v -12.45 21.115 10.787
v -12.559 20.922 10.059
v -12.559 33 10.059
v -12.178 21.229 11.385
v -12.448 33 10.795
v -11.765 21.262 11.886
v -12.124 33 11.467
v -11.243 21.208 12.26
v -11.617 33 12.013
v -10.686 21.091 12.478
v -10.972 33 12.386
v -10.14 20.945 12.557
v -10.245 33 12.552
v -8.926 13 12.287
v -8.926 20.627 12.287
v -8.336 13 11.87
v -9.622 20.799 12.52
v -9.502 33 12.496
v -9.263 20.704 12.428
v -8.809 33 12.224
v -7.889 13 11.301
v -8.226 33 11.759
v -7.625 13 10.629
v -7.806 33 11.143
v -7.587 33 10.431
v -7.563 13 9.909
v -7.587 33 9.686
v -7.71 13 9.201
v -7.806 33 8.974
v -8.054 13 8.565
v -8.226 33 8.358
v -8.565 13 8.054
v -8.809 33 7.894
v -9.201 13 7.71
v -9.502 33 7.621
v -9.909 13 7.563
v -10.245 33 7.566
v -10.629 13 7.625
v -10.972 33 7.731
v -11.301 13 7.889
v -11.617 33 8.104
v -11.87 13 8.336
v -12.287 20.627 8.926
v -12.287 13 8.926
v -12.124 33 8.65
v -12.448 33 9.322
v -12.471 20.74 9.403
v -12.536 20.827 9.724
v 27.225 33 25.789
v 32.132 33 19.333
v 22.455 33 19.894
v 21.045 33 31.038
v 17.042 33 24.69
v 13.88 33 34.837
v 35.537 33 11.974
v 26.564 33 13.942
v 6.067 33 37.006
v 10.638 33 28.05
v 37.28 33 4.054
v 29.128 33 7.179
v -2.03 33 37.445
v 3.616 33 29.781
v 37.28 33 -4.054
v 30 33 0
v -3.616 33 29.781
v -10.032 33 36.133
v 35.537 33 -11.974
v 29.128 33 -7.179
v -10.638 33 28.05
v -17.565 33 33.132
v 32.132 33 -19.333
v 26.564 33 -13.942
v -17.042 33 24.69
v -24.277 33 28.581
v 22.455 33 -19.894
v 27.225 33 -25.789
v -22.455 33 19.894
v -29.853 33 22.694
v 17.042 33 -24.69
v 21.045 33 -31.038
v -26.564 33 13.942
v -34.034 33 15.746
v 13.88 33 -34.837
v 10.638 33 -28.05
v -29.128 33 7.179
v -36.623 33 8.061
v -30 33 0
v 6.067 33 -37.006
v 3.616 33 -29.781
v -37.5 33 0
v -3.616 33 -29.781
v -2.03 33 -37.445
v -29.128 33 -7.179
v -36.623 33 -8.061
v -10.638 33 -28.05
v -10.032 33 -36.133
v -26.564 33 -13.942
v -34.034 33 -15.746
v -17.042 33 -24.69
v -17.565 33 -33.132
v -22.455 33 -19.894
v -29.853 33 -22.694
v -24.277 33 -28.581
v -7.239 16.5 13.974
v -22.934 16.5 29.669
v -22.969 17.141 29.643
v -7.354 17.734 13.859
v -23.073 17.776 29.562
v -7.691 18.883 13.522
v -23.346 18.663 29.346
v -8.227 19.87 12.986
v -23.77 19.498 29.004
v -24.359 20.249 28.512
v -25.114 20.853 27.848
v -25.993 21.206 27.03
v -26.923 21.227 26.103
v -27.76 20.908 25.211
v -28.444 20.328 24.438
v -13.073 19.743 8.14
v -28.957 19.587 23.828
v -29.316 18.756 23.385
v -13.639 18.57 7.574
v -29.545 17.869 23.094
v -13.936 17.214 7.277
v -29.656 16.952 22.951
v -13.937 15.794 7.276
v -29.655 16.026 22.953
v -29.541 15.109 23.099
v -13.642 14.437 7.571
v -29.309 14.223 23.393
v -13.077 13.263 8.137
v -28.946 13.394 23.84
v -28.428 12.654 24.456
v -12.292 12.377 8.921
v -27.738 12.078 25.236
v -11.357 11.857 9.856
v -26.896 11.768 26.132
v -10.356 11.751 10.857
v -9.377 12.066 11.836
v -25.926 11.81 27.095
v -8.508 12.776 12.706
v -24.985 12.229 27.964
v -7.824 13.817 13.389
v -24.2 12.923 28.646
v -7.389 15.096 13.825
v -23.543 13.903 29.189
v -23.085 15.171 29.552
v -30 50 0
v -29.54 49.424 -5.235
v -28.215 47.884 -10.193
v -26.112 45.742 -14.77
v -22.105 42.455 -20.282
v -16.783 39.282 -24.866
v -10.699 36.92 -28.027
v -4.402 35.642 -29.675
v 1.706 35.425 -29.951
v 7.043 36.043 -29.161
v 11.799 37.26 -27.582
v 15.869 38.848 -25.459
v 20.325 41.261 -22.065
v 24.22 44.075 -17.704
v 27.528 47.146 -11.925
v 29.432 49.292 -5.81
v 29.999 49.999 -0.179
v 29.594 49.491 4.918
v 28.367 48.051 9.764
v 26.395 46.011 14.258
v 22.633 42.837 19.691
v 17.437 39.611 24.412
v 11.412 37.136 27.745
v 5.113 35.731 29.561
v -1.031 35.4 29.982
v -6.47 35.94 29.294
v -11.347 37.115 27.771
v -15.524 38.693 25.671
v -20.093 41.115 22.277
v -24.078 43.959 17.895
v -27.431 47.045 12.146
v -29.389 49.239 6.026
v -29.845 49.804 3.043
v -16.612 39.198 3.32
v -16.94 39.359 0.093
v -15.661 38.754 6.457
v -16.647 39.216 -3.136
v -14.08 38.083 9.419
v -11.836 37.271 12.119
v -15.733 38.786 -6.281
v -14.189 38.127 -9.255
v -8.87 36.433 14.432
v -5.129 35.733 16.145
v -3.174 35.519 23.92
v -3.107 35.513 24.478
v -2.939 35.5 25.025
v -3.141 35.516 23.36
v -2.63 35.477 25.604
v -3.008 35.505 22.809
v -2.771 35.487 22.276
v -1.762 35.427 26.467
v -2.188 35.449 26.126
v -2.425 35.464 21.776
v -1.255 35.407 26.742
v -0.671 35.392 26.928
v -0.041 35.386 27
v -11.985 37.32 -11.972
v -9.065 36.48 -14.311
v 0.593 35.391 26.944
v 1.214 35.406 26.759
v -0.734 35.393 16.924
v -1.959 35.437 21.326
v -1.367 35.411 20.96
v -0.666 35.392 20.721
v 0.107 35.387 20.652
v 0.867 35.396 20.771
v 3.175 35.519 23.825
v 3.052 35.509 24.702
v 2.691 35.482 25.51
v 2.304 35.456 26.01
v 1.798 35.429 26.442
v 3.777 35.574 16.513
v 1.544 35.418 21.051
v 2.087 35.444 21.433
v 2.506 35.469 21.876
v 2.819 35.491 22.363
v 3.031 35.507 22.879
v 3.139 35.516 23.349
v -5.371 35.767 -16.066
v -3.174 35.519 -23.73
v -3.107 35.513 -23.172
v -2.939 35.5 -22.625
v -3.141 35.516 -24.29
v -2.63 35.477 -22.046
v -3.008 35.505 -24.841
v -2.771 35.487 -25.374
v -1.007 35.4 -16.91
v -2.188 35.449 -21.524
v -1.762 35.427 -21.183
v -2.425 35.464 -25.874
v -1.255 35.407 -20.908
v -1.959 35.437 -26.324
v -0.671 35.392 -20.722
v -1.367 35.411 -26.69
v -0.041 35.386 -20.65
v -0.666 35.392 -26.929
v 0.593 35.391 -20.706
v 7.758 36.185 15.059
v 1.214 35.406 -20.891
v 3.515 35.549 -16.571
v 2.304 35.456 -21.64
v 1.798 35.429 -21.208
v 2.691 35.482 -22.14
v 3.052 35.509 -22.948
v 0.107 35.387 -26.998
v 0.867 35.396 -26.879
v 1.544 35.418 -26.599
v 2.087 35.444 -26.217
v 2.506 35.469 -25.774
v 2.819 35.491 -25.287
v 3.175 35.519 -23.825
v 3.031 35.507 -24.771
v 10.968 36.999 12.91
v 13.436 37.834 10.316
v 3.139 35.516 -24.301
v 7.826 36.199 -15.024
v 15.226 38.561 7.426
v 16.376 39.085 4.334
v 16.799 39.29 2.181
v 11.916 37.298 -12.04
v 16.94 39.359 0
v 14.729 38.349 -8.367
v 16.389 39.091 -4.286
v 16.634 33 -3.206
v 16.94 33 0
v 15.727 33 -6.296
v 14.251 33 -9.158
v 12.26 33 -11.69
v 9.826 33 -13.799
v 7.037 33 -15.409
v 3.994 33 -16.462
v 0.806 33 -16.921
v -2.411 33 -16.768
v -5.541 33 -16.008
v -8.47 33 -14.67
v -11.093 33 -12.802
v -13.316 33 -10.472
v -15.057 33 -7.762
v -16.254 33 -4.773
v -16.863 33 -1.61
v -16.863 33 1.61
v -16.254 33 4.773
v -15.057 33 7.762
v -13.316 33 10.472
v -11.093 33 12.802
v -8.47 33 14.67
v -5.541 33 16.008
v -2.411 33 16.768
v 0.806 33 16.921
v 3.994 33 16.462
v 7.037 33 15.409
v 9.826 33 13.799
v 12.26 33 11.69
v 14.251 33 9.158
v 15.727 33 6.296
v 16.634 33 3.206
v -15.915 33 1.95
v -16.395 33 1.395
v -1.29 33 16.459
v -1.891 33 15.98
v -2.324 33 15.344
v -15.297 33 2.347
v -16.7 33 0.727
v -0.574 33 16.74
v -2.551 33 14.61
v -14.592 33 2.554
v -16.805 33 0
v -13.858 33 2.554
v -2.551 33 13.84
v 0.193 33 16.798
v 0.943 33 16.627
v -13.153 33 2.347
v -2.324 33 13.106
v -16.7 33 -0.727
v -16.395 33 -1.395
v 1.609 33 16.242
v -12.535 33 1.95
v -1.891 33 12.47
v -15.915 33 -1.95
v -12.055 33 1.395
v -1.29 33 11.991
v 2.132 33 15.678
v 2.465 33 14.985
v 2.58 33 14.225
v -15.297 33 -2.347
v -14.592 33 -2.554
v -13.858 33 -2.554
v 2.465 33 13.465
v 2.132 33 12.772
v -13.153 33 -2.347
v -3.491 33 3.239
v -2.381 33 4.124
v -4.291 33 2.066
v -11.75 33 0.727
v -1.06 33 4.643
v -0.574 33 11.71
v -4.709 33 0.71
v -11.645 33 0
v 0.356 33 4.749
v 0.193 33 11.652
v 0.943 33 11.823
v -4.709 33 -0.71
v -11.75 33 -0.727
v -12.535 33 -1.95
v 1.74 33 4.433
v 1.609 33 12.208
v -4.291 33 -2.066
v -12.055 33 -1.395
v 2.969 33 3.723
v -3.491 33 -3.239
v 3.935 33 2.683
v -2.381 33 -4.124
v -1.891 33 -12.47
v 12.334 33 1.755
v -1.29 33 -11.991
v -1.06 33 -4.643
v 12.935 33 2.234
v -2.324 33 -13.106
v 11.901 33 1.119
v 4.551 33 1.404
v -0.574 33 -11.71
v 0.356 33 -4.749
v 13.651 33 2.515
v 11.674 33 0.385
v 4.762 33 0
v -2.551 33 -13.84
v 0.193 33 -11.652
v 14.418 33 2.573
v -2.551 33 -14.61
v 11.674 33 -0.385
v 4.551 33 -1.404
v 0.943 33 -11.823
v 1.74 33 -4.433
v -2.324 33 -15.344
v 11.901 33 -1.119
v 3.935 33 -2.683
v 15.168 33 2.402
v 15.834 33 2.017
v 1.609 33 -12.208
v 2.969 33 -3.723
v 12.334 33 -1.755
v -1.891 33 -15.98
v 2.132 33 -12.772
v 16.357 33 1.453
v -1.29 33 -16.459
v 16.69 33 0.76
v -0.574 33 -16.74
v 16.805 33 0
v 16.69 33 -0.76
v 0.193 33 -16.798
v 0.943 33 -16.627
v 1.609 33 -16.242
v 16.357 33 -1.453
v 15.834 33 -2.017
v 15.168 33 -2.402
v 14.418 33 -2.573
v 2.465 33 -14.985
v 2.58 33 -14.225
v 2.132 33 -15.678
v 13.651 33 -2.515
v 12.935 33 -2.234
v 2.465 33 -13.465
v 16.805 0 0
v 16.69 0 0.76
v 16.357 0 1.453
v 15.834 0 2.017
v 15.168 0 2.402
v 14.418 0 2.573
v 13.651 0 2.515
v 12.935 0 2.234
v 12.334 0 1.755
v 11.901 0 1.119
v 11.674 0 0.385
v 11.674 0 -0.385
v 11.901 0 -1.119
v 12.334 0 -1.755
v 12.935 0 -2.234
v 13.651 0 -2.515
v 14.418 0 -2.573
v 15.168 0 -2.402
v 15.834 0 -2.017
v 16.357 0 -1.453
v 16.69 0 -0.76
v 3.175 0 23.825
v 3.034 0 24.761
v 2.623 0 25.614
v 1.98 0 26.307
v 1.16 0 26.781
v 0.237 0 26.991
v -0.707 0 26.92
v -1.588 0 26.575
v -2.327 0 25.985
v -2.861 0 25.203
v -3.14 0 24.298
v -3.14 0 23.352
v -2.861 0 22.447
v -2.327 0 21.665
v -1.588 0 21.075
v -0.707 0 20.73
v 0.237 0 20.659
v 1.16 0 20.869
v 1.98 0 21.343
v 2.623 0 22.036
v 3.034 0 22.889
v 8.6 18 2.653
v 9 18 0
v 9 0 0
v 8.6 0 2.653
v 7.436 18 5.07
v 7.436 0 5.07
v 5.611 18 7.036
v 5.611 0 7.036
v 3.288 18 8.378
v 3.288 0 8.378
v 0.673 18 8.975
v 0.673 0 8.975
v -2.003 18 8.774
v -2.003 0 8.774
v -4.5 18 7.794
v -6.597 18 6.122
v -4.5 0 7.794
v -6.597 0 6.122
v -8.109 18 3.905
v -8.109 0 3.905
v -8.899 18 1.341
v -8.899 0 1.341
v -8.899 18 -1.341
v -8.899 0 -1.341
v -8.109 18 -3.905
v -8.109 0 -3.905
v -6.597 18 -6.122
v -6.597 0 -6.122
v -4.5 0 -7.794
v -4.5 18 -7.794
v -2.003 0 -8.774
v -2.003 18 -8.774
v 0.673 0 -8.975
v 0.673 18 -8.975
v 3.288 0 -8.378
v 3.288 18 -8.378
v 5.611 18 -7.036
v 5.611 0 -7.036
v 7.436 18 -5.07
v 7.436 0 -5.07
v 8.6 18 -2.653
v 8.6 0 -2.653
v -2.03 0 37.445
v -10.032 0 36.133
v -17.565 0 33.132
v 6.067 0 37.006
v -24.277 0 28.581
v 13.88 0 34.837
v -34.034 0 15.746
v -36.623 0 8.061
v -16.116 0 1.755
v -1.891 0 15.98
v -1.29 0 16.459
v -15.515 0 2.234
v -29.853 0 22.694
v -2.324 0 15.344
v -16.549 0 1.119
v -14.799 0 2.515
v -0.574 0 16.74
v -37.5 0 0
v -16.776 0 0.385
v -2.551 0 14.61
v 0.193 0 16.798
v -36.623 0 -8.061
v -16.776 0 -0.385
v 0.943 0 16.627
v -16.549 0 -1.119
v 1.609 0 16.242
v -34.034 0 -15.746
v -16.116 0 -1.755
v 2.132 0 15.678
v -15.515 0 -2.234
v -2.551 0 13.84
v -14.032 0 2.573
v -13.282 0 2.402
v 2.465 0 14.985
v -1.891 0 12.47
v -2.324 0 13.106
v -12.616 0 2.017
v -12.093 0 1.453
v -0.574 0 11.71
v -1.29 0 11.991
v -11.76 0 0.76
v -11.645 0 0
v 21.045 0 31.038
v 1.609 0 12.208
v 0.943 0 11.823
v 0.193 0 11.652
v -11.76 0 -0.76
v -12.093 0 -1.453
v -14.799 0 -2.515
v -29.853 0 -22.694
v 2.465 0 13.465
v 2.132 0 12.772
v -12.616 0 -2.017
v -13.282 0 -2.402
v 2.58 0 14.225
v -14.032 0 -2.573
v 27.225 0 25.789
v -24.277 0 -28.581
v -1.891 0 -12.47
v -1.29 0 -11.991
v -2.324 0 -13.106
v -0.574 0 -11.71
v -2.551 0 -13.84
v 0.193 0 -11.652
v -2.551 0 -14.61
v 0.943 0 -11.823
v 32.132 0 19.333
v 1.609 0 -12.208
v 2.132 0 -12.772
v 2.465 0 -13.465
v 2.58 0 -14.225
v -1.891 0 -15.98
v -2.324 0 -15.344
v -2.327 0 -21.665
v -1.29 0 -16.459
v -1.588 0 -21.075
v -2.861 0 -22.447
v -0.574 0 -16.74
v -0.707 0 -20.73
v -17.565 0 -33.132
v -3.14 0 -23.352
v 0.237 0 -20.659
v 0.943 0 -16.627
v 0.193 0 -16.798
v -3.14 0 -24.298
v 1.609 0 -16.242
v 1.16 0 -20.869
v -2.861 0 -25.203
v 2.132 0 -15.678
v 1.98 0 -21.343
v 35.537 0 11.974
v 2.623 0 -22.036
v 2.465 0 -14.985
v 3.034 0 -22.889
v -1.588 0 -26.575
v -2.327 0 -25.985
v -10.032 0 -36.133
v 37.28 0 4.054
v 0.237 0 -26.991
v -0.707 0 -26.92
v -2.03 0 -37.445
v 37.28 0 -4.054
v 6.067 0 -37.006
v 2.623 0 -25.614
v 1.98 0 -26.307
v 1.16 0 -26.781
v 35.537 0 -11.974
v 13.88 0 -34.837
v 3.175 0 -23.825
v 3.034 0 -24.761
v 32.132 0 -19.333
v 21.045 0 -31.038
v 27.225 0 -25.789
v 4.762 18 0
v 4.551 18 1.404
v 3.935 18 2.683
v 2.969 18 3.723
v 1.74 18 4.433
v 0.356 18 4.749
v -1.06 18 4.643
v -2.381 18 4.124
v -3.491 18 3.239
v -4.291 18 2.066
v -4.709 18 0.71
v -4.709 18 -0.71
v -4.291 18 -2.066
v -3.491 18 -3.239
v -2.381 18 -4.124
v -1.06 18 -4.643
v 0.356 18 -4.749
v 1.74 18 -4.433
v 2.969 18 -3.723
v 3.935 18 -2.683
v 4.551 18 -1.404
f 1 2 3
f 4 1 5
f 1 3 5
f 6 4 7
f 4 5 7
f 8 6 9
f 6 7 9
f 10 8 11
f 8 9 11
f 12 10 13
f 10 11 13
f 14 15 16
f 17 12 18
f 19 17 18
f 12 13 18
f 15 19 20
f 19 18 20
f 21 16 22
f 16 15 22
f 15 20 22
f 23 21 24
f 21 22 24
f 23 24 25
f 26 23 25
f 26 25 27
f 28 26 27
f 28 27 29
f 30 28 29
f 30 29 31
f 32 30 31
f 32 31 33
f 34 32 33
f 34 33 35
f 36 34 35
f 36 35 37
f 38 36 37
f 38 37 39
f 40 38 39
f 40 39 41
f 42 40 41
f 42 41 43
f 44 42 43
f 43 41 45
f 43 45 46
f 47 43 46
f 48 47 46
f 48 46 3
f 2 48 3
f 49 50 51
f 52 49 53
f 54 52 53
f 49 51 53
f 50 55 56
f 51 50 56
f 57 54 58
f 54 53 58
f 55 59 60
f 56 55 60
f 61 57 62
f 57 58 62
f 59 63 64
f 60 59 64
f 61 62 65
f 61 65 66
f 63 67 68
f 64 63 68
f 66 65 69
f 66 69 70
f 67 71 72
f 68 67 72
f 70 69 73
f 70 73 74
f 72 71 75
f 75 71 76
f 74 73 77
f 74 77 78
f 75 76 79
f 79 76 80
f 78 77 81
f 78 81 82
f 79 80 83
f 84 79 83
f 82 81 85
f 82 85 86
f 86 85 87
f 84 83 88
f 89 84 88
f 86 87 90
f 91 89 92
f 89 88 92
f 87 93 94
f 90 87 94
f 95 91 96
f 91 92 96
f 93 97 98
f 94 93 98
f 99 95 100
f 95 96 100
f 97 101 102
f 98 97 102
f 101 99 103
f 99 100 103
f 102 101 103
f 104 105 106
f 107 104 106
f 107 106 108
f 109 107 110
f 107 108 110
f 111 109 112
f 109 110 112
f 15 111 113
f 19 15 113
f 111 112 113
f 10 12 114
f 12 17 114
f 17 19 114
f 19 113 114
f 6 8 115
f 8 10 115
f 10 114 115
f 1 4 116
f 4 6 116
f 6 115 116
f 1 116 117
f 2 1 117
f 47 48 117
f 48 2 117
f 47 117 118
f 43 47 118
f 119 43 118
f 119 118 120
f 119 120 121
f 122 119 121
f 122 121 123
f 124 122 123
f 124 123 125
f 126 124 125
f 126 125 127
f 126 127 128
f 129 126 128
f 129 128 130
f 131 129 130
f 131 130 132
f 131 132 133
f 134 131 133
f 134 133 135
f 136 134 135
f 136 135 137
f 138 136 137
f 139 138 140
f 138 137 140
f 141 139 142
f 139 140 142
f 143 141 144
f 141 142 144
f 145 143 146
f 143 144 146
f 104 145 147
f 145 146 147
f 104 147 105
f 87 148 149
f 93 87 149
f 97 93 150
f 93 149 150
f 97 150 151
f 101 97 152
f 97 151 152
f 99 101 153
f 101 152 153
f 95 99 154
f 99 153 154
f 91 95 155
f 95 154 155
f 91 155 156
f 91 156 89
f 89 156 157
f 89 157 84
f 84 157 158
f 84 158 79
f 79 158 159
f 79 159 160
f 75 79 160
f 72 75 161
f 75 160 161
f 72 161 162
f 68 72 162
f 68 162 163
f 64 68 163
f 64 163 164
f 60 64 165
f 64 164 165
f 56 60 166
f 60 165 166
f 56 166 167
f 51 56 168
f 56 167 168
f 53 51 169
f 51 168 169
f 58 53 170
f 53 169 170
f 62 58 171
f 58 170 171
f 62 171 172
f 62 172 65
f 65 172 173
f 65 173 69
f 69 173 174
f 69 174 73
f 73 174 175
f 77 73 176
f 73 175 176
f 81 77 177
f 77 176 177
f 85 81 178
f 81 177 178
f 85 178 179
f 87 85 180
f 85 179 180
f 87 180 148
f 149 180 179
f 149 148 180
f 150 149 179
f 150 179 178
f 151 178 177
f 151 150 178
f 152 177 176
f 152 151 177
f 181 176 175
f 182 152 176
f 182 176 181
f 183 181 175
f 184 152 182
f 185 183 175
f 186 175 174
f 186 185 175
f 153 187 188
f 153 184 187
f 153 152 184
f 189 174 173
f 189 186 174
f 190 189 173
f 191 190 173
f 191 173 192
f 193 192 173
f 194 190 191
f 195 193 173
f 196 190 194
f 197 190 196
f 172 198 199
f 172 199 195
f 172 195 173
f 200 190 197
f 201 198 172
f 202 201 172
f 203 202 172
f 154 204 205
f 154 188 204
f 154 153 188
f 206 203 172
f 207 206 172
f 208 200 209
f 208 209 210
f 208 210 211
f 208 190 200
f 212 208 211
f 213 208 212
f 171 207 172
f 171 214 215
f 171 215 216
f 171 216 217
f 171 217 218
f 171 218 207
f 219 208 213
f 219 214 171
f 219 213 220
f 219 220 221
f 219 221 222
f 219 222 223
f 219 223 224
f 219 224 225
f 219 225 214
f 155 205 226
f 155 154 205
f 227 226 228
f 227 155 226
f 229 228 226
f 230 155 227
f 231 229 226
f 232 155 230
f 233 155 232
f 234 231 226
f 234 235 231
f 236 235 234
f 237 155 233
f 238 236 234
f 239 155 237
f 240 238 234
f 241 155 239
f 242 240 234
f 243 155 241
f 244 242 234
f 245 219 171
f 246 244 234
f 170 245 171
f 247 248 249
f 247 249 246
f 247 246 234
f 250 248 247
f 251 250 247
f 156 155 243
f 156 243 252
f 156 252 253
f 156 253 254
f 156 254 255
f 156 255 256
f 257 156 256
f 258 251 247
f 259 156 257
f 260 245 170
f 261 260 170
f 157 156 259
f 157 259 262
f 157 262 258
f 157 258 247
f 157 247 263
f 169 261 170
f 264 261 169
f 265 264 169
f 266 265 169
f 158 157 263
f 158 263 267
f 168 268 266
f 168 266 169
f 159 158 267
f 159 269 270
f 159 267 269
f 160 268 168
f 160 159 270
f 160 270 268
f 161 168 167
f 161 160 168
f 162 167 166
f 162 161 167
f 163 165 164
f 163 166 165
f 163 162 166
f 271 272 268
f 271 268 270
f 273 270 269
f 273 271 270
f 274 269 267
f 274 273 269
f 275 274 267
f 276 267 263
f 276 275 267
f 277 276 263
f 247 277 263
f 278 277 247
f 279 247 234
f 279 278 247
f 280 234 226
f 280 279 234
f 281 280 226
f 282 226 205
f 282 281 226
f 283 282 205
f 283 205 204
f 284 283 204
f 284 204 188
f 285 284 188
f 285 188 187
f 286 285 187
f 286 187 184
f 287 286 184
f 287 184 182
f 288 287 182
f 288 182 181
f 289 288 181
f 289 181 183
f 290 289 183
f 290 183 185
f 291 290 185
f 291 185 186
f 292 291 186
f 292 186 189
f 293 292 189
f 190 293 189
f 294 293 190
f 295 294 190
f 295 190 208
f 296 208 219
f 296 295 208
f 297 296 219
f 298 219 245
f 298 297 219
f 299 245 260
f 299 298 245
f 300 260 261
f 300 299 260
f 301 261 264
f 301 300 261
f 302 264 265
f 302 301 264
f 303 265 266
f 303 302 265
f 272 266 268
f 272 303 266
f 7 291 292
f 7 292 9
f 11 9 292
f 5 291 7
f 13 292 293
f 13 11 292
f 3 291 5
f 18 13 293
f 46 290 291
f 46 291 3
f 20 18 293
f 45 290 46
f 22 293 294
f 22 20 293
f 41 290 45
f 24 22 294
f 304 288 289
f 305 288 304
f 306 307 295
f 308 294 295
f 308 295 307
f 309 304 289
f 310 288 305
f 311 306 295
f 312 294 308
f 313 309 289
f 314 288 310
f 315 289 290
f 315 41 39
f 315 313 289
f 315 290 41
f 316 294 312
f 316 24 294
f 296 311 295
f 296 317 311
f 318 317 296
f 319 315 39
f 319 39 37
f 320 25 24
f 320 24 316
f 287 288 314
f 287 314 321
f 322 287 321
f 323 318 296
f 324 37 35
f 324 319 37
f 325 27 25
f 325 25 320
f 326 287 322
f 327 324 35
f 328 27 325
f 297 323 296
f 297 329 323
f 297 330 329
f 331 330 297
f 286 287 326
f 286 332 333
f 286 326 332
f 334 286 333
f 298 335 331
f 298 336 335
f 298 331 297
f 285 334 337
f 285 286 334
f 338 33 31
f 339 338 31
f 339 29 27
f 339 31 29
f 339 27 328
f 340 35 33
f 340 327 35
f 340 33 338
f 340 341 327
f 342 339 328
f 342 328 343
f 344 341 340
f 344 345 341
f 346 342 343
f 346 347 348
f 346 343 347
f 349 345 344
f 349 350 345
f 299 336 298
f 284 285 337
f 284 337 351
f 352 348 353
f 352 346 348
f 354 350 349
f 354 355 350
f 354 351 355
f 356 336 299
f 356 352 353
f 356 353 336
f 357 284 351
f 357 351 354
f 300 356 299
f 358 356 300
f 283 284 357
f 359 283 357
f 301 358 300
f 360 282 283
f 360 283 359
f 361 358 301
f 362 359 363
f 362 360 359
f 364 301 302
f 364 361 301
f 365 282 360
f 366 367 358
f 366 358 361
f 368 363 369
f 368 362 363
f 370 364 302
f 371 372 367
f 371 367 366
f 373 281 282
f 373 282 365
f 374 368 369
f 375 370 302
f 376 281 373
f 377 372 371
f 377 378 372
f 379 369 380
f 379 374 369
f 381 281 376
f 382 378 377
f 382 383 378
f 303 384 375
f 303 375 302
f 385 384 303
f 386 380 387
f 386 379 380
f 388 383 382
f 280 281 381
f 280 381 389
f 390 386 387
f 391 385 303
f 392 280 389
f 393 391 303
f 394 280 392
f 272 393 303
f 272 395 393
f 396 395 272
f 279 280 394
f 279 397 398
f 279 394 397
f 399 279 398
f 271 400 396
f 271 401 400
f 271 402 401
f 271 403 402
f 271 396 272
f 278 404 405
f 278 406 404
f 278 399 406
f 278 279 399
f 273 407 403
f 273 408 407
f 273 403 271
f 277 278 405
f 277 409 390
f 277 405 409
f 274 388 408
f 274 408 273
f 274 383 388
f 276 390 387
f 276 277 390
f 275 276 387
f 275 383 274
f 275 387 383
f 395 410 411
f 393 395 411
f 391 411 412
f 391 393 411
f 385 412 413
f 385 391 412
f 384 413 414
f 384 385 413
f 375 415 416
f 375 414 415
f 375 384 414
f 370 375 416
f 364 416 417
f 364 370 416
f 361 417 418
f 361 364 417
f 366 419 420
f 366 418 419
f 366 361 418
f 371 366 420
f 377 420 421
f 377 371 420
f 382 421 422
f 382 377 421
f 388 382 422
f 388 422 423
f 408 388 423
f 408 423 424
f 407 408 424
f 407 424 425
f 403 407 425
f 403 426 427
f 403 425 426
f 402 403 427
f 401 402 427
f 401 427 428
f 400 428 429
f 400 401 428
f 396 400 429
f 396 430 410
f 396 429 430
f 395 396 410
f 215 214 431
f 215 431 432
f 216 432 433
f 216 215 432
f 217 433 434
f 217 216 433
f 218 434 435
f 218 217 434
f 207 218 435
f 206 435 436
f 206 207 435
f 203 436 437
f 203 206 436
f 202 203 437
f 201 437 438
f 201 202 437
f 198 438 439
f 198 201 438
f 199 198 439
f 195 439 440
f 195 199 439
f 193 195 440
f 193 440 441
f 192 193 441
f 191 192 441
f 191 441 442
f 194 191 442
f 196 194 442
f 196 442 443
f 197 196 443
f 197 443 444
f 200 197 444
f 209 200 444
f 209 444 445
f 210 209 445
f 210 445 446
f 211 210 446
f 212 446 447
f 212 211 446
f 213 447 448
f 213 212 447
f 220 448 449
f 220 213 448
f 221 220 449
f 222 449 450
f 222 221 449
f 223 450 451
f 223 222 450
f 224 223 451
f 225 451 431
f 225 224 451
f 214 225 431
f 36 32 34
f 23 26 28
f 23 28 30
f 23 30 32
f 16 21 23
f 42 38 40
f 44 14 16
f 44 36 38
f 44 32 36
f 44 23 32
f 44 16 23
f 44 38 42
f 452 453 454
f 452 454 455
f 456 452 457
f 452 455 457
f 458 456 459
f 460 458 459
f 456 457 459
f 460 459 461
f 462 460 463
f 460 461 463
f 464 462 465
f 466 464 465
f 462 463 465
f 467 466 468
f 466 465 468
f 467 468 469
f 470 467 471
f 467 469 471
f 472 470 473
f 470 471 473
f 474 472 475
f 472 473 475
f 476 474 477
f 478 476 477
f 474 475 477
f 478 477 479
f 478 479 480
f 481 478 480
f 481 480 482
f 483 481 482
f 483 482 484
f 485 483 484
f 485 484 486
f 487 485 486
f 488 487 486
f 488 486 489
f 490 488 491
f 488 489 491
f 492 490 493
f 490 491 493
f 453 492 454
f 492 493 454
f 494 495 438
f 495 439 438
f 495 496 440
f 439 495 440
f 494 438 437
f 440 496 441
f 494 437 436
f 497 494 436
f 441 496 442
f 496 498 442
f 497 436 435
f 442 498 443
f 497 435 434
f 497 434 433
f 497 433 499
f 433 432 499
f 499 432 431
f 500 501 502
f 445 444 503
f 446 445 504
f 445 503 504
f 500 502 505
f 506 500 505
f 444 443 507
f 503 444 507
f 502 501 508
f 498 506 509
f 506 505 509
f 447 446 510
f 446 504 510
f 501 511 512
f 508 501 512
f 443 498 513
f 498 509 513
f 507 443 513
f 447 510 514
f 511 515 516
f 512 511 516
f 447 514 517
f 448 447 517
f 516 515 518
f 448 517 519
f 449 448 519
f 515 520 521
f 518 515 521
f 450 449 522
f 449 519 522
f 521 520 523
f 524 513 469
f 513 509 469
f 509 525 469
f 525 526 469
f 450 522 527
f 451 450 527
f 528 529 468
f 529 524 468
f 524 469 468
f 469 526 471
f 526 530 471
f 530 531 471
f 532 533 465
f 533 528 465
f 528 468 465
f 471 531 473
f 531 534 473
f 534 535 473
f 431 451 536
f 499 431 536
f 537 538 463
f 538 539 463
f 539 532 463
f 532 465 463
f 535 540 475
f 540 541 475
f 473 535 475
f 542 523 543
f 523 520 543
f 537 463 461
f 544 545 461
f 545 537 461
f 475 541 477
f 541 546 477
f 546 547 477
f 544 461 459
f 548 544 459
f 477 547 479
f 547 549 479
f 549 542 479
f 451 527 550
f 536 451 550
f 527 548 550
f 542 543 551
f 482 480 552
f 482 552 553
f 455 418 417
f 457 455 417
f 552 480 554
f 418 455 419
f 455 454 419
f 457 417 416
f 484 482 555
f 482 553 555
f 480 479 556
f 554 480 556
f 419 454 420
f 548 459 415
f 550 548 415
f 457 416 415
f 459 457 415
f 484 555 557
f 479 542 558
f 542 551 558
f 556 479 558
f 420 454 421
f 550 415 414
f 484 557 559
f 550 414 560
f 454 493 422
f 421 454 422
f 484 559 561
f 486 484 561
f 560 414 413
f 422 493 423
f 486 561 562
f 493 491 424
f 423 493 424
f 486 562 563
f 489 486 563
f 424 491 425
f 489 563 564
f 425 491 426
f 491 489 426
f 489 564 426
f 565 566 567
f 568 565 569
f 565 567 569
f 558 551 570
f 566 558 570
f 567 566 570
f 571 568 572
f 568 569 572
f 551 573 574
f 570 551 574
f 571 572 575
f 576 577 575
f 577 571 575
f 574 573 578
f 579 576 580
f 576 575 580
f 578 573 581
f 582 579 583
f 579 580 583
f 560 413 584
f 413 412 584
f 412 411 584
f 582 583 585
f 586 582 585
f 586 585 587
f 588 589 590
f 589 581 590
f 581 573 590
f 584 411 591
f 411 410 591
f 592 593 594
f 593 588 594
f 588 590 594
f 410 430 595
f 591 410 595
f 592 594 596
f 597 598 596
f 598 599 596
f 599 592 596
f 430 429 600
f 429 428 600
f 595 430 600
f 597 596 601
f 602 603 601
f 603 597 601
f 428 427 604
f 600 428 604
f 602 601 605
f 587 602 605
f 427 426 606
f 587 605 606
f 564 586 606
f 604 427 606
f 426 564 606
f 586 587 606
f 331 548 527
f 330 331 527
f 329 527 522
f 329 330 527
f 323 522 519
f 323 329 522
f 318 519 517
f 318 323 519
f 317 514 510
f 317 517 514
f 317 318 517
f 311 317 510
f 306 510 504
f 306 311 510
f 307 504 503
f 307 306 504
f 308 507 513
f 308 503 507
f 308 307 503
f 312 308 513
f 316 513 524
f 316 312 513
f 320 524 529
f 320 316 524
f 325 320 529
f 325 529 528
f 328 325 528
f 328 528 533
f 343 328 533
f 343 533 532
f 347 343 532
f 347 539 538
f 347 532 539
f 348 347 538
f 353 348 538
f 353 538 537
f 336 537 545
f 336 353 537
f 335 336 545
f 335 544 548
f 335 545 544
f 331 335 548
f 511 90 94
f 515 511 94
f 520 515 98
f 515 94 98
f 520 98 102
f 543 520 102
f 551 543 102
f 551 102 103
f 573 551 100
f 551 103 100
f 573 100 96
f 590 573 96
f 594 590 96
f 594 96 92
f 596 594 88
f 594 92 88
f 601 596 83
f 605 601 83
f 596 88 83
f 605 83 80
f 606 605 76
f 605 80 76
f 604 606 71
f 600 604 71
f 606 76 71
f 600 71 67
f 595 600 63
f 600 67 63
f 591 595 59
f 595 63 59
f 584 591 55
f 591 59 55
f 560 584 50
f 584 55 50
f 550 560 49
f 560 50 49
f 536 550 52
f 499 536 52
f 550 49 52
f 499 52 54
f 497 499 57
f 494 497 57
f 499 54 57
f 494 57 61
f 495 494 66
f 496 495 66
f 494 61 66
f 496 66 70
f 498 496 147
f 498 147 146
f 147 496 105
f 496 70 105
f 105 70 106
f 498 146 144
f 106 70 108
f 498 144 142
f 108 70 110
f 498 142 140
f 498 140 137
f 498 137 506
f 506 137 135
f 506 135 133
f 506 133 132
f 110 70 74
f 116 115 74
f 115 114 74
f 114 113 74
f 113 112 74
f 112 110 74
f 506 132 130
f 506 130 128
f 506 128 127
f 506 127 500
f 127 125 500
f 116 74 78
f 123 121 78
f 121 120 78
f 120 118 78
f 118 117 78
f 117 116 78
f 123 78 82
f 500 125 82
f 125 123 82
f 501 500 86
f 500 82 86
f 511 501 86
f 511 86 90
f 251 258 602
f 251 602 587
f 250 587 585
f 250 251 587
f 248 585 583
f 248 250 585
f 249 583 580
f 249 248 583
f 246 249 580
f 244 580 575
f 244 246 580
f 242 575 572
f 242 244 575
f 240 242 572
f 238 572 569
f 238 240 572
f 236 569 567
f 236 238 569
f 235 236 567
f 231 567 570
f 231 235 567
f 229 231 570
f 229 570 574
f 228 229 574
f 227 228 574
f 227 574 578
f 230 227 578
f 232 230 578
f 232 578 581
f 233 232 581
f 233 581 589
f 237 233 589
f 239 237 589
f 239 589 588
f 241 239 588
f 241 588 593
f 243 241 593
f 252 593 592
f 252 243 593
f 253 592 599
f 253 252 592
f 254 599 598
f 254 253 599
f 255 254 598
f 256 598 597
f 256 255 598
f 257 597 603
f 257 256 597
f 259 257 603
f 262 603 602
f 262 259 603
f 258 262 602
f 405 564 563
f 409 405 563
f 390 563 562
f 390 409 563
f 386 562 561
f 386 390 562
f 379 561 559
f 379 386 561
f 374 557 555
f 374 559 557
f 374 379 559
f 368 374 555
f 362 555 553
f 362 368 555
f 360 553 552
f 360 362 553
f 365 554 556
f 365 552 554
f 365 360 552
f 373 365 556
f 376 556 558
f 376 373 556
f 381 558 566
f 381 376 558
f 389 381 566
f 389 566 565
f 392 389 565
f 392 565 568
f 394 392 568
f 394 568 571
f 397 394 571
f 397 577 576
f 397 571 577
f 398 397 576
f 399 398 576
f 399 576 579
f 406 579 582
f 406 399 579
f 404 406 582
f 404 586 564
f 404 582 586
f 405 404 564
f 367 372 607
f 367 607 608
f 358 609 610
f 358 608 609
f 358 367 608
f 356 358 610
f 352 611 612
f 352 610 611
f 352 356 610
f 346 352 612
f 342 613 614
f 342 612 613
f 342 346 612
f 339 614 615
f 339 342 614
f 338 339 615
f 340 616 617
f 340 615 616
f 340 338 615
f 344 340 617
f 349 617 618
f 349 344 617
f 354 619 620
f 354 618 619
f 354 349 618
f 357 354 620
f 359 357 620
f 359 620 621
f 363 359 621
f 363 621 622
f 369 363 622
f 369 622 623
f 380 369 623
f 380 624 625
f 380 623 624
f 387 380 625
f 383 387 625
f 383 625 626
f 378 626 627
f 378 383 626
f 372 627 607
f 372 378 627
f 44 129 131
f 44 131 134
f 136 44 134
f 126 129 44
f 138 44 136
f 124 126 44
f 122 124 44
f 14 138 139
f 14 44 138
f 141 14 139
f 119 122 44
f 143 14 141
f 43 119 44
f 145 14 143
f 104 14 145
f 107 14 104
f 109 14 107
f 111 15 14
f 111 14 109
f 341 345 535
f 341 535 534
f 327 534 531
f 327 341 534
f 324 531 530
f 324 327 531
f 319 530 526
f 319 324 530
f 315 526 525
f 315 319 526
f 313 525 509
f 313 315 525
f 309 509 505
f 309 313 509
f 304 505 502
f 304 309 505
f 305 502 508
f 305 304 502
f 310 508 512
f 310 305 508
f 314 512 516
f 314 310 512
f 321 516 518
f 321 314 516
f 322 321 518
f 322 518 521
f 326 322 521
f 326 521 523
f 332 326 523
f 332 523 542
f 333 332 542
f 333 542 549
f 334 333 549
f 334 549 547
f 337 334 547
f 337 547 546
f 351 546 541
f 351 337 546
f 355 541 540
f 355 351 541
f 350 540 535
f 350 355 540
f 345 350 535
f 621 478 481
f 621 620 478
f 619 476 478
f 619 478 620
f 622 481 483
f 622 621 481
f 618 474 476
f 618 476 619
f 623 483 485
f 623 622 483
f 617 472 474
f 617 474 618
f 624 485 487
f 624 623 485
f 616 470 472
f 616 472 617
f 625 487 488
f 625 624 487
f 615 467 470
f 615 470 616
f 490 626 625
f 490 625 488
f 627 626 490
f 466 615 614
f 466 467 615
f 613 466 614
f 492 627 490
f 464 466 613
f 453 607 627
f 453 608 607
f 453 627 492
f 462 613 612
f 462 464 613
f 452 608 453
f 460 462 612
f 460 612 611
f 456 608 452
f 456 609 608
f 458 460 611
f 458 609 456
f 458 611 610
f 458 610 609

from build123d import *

# Parameters (mm, degrees)
CUT_EXTRUDE1_DEPTH      = 73.886898686
CUT_EXTRUDE1_DEPTH_BACK = 73.886898686
SKETCH2_R               = 38.1
CUT_EXTRUDE2_DEPTH      = 73.886898754
CUT_EXTRUDE2_DEPTH_BACK = 73.886898754
SKETCH3_R               = 4.7625
SKETCH7_R               = 4.7625
CUT_EXTRUDE5_DEPTH      = 22.5
CUT_EXTRUDE3_DEPTH      = 73.886898857
CUT_EXTRUDE3_DEPTH_BACK = 73.886898857
SKETCH4_R               = 3.175
SKETCH4_R_2             = 2.58
SKETCH5_R               = 16.94
CUT_EXTRUDE4_DEPTH      = 63.461988614
SKETCH8_R               = 2.5
CUT_EXTRUDE6_DEPTH      = 20
SKETCH9_R               = 9
CUT_EXTRUDE7_DEPTH      = 18


with BuildPart() as part:
    # Sketch1 → Revolve1 (revolve)
    with BuildSketch(Plane.XY, mode=Mode.PRIVATE) as revolve1_sk:
        Polygon((0, 0), (37.5, 0), (37.5, 33), (30, 33), (30, 50), (0, 50), align=None)
    revolve(revolve1_sk.sketch.rotate(Axis((0, 50, 0), (0, -1, 0)), 180), axis=Axis((0, 50, 0), (0, -1, 0)))

    # Sketch2 → Cut-Extrude1 (cut, two sides: drawn at the far end of the back side and taken through both)
    with BuildSketch(Plane.XY.offset(-CUT_EXTRUDE1_DEPTH_BACK)):
        with Locations((0, 73.486379031)):
            Circle(SKETCH2_R)
    extrude(amount=CUT_EXTRUDE1_DEPTH + CUT_EXTRUDE1_DEPTH_BACK, mode=Mode.SUBTRACT)

    # Sketch3 → Cut-Extrude2 (cut, two sides: drawn at the far end of the back side and taken through both)
    with BuildSketch(Plane.XZ.offset(-CUT_EXTRUDE2_DEPTH_BACK)):
        Circle(SKETCH3_R)
    extrude(amount=CUT_EXTRUDE2_DEPTH + CUT_EXTRUDE2_DEPTH_BACK, mode=Mode.SUBTRACT)

    # Sketch7 → Cut-Extrude5 (cut)
    with BuildSketch(Plane(origin=(-26.516504294, 0, 26.516504294), x_dir=(0, 1, 0), z_dir=(-0.7071067811865464, 0, 0.7071067811865488))):
        with Locations(Location((16.5, 0, 0), (0, 0, 270))):
            Circle(SKETCH7_R)
    extrude(amount=-CUT_EXTRUDE5_DEPTH, mode=Mode.SUBTRACT)

    # Sketch4 → Cut-Extrude3 (cut, two sides: drawn at the far end of the back side and taken through both)
    with BuildSketch(Plane.XZ.offset(-CUT_EXTRUDE3_DEPTH_BACK)):
        with Locations((0, 23.825)):
            Circle(SKETCH4_R)
        with Locations((0, -23.825)):
            Circle(SKETCH4_R)
        with Locations((-14.225, 0)):
            Circle(SKETCH4_R_2)
        with Locations((0, 14.225)):
            Circle(SKETCH4_R_2)
        with Locations((14.225, 0)):
            Circle(SKETCH4_R_2)
        with Locations((0, -14.225)):
            Circle(SKETCH4_R_2)
    extrude(amount=CUT_EXTRUDE3_DEPTH + CUT_EXTRUDE3_DEPTH_BACK, mode=Mode.SUBTRACT)

    # Sketch5 → Cut-Extrude4 (cut, through all)
    with BuildSketch(Plane(origin=(0, 33, 0), x_dir=(1, 0, 0), z_dir=(0, 1, 0))):
        Circle(SKETCH5_R)
    extrude(amount=CUT_EXTRUDE4_DEPTH, mode=Mode.SUBTRACT)

    # Sketch8 → Cut-Extrude6 (cut)
    with BuildSketch(Plane(origin=(0, 33, 0), x_dir=(1, 0, 0), z_dir=(0, 1, 0))):
        with Locations(Location((-10.058593962, -10.058593962, 0), (0, 0, 180))):
            Circle(SKETCH8_R)
    extrude(amount=-CUT_EXTRUDE6_DEPTH, mode=Mode.SUBTRACT)

    # Sketch9 → Cut-Extrude7 (cut)
    with BuildSketch(Plane.XZ):
        Circle(SKETCH9_R)
    extrude(amount=-CUT_EXTRUDE7_DEPTH, mode=Mode.SUBTRACT)


solid = part.part
